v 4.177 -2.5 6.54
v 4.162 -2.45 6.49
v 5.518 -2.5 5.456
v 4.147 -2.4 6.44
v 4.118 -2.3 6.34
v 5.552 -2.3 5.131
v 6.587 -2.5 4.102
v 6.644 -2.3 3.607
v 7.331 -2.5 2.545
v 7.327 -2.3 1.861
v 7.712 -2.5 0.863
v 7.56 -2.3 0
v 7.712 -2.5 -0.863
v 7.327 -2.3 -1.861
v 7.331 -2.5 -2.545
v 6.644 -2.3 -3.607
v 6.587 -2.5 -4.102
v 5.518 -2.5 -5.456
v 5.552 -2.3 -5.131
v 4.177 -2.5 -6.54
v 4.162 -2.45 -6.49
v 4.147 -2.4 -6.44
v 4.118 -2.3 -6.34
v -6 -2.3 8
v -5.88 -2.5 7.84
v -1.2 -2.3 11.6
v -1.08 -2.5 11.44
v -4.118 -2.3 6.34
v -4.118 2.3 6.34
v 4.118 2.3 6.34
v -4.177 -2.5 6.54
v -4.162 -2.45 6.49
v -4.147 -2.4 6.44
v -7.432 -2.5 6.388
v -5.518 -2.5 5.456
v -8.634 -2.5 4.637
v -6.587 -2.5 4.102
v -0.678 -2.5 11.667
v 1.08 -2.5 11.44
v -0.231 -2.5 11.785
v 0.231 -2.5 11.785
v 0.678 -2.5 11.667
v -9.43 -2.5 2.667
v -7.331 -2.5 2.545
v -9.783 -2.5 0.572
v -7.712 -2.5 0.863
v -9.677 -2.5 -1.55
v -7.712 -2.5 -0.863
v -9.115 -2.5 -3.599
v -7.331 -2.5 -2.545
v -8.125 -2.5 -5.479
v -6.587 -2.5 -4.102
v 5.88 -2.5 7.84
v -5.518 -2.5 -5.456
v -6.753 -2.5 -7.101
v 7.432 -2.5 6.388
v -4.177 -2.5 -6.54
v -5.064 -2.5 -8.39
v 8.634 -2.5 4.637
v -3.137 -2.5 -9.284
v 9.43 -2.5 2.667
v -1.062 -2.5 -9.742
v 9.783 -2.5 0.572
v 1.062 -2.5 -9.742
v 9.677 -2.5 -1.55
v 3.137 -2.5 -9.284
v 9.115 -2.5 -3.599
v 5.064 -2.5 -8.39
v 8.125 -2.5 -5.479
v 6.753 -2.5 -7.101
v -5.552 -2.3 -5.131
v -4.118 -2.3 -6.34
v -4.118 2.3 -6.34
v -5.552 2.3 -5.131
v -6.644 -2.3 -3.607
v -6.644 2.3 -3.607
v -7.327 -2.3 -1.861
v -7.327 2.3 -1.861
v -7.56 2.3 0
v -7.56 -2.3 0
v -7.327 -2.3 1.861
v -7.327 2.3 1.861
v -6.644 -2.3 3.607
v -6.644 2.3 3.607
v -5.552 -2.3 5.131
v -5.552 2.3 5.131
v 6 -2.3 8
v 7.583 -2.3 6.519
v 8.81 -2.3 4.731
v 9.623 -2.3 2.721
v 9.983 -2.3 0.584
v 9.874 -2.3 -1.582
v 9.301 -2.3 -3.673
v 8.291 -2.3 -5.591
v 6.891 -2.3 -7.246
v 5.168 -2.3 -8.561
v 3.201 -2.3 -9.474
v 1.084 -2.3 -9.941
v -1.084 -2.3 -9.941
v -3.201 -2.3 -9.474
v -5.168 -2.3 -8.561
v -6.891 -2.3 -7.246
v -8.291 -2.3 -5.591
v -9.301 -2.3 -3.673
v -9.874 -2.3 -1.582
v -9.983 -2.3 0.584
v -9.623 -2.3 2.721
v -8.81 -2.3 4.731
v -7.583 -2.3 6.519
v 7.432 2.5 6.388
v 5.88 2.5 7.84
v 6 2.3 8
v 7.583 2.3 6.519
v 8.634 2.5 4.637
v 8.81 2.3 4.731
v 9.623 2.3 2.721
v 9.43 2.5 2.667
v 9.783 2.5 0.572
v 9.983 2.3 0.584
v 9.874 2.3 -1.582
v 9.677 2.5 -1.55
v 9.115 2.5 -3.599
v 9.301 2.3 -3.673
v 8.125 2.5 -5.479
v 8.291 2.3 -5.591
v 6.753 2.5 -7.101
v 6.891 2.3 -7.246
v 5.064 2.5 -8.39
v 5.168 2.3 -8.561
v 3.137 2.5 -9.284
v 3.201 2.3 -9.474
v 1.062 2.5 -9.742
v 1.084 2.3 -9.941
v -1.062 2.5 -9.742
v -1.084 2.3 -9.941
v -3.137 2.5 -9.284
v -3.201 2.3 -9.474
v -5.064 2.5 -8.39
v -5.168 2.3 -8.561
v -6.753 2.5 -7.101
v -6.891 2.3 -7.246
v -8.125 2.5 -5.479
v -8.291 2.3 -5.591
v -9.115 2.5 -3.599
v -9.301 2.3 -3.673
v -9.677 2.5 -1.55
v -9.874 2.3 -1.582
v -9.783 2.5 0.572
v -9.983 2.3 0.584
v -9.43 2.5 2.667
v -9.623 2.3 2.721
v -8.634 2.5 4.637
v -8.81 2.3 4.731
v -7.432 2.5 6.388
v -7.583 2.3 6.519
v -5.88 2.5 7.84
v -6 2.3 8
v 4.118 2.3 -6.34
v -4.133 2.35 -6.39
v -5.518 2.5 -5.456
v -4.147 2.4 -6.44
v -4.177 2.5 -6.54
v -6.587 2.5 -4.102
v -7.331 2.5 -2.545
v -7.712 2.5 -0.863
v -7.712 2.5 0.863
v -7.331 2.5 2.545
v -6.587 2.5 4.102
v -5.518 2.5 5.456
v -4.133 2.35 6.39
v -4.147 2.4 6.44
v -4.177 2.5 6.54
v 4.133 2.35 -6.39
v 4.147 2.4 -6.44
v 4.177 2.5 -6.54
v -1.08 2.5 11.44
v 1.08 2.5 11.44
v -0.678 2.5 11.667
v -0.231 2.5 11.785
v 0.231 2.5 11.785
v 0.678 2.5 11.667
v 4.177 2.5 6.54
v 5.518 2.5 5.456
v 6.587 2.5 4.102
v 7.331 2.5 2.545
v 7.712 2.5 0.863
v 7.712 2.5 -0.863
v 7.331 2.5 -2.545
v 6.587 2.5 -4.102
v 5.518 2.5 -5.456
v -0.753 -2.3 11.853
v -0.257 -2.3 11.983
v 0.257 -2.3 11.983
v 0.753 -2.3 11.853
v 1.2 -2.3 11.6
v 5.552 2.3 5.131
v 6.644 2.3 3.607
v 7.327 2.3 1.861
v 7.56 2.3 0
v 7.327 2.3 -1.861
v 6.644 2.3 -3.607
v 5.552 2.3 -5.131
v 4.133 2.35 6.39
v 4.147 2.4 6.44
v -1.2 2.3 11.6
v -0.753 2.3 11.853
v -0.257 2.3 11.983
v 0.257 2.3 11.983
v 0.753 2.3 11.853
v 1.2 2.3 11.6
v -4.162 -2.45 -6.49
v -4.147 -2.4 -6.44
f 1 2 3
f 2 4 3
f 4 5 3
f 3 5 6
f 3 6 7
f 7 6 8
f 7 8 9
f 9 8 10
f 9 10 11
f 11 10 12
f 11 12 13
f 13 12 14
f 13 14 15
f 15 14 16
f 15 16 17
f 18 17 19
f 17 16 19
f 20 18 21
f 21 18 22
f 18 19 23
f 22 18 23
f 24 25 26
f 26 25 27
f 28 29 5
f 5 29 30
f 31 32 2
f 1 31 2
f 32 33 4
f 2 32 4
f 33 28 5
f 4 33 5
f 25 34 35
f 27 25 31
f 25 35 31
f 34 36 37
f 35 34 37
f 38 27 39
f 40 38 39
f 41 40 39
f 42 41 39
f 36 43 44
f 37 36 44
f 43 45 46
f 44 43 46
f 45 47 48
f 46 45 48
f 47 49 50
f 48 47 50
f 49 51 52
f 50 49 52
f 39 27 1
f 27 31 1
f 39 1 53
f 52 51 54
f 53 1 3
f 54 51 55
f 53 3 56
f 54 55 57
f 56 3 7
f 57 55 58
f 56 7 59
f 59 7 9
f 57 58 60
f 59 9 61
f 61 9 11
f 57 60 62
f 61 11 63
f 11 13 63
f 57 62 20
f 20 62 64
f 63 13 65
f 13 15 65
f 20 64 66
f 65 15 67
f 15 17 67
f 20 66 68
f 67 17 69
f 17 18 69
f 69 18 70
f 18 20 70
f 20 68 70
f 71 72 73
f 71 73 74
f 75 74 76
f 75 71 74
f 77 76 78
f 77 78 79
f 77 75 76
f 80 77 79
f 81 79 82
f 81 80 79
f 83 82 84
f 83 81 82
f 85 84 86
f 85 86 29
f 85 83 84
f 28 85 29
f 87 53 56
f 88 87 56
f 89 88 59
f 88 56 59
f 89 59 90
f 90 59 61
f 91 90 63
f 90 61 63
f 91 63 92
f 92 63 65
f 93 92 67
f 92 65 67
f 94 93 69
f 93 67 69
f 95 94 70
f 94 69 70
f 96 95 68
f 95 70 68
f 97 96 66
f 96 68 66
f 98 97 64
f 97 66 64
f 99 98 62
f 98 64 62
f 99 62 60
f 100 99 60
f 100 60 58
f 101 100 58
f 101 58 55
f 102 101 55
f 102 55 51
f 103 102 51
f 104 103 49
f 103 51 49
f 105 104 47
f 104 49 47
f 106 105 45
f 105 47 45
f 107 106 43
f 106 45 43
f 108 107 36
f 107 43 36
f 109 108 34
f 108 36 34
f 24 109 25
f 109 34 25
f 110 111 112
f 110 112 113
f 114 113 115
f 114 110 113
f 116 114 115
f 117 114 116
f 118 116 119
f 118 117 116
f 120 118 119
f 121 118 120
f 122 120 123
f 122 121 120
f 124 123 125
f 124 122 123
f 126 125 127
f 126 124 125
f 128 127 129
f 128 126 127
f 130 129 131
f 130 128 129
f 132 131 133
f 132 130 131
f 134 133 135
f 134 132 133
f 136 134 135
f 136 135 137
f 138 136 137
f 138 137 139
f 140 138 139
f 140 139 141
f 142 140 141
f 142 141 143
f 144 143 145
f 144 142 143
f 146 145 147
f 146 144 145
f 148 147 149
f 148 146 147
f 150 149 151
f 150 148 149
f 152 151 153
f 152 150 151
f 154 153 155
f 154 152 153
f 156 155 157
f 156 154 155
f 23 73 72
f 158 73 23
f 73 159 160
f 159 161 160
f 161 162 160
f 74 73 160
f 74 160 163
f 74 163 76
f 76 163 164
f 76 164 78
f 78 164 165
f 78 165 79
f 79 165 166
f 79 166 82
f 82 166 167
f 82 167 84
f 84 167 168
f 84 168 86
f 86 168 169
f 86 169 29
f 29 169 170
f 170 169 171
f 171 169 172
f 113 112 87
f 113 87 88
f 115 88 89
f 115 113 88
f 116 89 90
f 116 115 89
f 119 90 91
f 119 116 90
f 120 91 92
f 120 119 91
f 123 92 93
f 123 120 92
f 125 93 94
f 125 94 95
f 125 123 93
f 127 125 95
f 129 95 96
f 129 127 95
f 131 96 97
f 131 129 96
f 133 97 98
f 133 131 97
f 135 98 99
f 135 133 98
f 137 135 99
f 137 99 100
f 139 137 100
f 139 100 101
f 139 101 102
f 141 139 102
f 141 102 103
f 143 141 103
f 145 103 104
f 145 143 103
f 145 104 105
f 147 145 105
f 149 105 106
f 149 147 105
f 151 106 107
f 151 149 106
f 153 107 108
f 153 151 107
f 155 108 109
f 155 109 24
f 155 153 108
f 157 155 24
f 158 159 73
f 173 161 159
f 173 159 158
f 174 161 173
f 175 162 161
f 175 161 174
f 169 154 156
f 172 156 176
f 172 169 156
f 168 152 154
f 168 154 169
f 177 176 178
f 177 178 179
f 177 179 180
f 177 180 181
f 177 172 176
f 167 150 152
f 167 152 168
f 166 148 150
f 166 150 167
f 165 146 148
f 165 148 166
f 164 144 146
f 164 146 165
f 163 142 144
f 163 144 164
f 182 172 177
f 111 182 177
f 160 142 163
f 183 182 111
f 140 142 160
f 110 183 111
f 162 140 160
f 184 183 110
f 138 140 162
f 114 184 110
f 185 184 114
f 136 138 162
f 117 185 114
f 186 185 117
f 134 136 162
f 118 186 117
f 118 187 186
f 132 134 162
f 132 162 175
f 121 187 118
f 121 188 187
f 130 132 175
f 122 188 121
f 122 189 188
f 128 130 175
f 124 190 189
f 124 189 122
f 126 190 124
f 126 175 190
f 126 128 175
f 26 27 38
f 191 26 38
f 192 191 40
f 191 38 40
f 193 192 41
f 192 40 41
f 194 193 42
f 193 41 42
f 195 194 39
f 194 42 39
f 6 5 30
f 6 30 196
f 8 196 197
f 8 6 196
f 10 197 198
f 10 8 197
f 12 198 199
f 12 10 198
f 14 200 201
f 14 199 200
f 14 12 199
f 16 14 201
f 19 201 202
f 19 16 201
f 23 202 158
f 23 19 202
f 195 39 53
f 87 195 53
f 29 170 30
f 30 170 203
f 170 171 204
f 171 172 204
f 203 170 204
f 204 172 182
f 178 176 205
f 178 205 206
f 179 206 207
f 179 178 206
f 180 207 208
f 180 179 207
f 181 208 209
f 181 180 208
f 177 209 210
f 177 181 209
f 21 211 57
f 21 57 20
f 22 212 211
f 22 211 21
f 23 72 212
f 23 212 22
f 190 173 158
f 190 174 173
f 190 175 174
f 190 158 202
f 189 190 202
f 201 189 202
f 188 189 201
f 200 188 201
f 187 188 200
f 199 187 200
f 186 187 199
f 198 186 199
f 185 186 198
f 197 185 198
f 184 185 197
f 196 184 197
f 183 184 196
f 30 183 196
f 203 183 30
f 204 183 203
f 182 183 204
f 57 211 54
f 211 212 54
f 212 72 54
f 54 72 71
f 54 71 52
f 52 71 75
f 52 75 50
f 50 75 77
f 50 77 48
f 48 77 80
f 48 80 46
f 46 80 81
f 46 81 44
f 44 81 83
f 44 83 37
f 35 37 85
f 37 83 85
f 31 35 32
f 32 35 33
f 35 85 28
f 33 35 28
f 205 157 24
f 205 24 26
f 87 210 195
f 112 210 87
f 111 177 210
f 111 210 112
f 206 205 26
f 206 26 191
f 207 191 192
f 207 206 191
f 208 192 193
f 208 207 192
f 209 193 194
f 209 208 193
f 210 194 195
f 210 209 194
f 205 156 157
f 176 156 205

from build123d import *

# Parameters (mm, degrees)
SKETCH1_R           = 10
SKETCH1_R_2         = 7.56
BOSS_EXTRUDE1_DEPTH = 2.5
BOSS_EXTRUDE2_DEPTH = 5
BOSS_EXTRUDE3_DEPTH = 5
CHAMFER1_SIZE       = 0.2


with BuildPart() as part:
    # Sketch1 → Boss-Extrude1 (new body, symmetric)
    with BuildSketch(Plane(origin=(0, 0, 0), x_dir=(1, 0, 0), z_dir=(0, 1, 0))):
        Circle(SKETCH1_R)
        Circle(SKETCH1_R_2, mode=Mode.SUBTRACT)
    extrude(amount=BOSS_EXTRUDE1_DEPTH, both=True)

    # Sketch2 → Boss-Extrude2 (add)
    with BuildSketch(Plane(origin=(0, 2.5, 0), x_dir=(1, 0, 0), z_dir=(0, 1, 0))):
        with BuildLine():
            Line((-4.118009228, -6.34), (4.118009228, -6.34))
            ThreePointArc((4.118009228, -6.34), (0, -7.56), (-4.118009228, -6.34))
        make_face()
        with BuildLine():
            Line((-4.118009228, 6.34), (4.118009228, 6.34))
            ThreePointArc((4.118009228, 6.34), (0, 7.56), (-4.118009228, 6.34))
        make_face()
    extrude(amount=-BOSS_EXTRUDE2_DEPTH)

    # Sketch3 → Boss-Extrude3 (add)
    with BuildSketch(Plane(origin=(0, 2.5, 0), x_dir=(1, 0, 0), z_dir=(0, 1, 0))):
        with BuildLine():
            Line((-6, -8), (-1.2, -11.6))
            ThreePointArc((-1.2, -11.6), (0, -12), (1.2, -11.6))
            Line((1.2, -11.6), (6, -8))
            ThreePointArc((6, -8), (0, -10), (-6, -8))
        make_face()
    extrude(amount=-BOSS_EXTRUDE3_DEPTH)

    # Chamfer1
    chamfer1_edges = [part.edges().sort_by_distance(p)[0] for p in [
        (-7.56, 2.5, 0),
        (-7.56, -2.5, 0),
        (0, 2.5, 6.34),
        (0, -2.5, 6.34),
        (0, 2.5, -6.34),
        (0, -2.5, -6.34),
        (0, -2.5, -10),
        (-3.6, 2.5, 9.8),
        (0, 2.5, 12),
        (3.6, 2.5, 9.8),
        (3.6, -2.5, 9.8),
        (0, -2.5, 12),
        (-3.6, -2.5, 9.8),
        (0, 2.5, -10),
        (7.56, -2.5, 0),
        (7.56, 2.5, 0),
    ]]
    chamfer(chamfer1_edges, length=CHAMFER1_SIZE)


solid = part.part
